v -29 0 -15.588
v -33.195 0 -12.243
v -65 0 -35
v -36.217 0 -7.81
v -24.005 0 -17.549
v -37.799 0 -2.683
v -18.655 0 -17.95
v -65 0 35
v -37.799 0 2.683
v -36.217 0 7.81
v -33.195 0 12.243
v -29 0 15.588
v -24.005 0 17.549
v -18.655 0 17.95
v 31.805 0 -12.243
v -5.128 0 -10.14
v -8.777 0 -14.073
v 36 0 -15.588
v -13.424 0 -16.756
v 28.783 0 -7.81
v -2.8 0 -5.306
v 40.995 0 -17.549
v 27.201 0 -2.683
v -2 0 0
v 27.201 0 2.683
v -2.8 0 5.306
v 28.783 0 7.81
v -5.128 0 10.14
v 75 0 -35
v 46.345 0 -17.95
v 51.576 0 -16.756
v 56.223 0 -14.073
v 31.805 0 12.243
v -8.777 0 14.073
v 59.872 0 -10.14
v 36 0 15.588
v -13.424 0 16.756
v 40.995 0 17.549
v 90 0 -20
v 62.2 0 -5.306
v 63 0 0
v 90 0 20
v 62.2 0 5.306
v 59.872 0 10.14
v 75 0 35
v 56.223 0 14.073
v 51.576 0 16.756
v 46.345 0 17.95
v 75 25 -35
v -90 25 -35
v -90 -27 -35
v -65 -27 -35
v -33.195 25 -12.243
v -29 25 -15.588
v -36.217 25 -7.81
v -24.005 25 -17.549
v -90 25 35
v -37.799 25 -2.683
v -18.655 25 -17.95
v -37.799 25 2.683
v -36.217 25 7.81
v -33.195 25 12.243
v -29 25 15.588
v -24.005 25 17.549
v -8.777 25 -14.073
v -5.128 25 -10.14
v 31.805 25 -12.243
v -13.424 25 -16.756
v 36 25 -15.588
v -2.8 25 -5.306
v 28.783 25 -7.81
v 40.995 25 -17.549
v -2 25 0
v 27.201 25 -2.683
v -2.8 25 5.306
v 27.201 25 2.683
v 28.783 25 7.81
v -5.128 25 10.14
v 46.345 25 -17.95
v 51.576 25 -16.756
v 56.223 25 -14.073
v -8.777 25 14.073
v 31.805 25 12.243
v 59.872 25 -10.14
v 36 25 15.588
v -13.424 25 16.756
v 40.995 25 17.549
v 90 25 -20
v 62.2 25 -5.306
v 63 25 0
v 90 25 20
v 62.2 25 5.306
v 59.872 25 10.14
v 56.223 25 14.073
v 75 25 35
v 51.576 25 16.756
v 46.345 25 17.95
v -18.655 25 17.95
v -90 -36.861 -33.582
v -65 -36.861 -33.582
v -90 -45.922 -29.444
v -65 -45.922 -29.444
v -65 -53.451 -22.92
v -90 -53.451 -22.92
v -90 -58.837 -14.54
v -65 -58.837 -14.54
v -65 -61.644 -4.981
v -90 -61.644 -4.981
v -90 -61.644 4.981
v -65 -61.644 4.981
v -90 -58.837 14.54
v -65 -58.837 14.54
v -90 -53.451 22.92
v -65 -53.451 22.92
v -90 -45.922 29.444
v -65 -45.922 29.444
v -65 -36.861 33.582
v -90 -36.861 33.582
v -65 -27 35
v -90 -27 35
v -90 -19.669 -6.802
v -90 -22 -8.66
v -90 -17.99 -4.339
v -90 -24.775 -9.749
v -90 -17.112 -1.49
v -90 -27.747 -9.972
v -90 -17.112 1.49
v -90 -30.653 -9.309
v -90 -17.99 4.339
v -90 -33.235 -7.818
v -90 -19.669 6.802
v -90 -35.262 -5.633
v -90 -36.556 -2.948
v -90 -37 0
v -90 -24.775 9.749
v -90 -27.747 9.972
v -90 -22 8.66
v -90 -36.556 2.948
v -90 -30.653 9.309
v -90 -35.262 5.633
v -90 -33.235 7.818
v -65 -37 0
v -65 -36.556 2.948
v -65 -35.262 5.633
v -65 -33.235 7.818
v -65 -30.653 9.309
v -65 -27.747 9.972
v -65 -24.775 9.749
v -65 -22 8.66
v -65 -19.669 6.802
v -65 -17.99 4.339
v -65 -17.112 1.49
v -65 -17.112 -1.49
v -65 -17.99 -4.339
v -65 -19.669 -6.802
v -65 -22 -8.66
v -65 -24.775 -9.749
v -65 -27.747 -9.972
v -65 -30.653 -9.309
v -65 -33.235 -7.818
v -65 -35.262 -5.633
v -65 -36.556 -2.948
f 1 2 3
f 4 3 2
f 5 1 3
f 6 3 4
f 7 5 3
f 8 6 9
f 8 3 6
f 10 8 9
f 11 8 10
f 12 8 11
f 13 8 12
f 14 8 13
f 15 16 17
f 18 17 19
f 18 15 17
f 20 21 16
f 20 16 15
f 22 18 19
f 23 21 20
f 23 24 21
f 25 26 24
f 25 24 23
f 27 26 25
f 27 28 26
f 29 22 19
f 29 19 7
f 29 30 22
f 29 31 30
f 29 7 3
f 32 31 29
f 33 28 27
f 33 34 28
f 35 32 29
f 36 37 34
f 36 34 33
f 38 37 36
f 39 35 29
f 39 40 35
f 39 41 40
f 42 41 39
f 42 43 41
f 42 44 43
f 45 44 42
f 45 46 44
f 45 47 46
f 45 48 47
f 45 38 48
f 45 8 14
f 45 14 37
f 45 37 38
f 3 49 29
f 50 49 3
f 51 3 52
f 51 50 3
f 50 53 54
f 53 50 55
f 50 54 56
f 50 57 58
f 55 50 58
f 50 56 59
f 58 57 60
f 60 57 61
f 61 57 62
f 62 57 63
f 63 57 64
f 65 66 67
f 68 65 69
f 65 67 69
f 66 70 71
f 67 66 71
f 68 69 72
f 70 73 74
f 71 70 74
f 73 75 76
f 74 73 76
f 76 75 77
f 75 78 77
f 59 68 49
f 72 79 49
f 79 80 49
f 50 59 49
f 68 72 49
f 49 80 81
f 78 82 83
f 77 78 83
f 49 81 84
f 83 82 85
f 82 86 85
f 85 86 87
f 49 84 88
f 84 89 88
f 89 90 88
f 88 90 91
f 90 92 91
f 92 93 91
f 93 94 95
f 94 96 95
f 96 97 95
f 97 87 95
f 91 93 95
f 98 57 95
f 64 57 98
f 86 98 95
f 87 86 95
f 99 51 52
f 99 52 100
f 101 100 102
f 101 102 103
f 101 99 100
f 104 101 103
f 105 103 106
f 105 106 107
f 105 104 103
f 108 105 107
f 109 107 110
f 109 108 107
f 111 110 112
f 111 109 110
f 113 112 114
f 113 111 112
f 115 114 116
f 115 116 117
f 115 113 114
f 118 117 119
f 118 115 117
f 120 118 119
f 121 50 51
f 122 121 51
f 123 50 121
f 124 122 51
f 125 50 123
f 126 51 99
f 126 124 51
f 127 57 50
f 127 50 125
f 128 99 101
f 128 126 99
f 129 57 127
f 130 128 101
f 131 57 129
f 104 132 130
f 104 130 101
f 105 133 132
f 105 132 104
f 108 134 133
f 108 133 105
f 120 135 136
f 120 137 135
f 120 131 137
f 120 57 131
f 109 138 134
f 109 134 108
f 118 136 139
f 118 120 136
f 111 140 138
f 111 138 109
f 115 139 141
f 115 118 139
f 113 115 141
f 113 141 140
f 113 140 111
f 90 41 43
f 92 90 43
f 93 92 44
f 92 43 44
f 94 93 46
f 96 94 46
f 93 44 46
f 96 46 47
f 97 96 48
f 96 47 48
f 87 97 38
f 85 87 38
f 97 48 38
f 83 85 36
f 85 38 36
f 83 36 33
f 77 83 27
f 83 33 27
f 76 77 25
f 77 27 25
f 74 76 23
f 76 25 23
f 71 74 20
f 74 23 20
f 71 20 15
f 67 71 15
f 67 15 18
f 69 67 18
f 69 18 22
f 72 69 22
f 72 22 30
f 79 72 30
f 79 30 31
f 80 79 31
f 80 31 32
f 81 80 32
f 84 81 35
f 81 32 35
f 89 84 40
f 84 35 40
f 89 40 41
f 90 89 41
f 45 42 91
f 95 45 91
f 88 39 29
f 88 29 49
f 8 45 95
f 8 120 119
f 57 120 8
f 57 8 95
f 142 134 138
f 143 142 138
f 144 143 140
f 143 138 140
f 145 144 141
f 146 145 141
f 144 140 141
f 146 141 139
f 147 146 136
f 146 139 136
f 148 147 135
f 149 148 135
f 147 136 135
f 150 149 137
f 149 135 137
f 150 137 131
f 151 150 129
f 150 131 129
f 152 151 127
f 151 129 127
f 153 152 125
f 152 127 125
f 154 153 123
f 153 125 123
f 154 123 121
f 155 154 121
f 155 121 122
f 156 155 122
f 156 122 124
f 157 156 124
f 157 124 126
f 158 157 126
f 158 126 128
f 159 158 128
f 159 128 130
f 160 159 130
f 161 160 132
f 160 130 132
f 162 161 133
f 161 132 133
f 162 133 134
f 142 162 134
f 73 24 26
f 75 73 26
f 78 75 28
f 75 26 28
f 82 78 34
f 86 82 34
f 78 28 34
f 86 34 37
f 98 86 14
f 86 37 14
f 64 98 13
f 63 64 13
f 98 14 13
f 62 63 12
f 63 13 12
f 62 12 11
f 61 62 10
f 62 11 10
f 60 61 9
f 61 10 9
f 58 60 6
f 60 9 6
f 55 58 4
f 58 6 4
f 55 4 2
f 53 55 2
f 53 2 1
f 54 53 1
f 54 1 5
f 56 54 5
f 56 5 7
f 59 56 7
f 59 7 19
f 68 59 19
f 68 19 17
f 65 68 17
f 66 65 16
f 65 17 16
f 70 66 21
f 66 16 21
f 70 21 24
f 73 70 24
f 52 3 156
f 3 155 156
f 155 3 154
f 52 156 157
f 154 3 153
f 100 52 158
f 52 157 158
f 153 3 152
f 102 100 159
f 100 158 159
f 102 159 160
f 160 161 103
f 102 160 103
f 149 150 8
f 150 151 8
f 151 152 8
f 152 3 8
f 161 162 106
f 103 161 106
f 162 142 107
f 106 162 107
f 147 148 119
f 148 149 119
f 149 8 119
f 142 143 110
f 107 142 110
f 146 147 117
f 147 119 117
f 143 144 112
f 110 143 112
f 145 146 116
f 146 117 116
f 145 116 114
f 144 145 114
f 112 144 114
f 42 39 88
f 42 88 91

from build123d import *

# Parameters (mm, degrees)
F0_W     = 155
F0_H     = 70
F0_R     = 18
F0_W_2   = 25
F1_DEPTH = 25
F2_R     = 10
F3_DEPTH = 25
F4_SIZE  = 15


with BuildPart() as f1:
    # F0 (on Front) → F1 (new body)
    with BuildSketch(Plane.XZ):
        with Locations((12.5, 0)):
            Rectangle(F0_W, F0_H)
        with Locations((-20, 0)):
            Circle(F0_R, mode=Mode.SUBTRACT)
        with Locations((45, 0)):
            Circle(F0_R, mode=Mode.SUBTRACT)
        with Locations((-77.5, 0)):
            Rectangle(F0_W_2, F0_H)
    extrude(amount=-F1_DEPTH)

    # F2 (on face) → F3 (join)
    with BuildSketch(Plane(origin=(-90, 0, 0), x_dir=(0, -1, 0), z_dir=(-1, 0, 0))):
        with BuildLine():
            Line((27, 35), (0, 35))
            Line((0, 35), (0, -35))
            Line((0, -35), (27, -35))
            ThreePointArc((27, -35), (62, 0), (27, 35))
        make_face()
        with Locations((27, 0)):
            Circle(F2_R, mode=Mode.SUBTRACT)
    extrude(amount=-F3_DEPTH)

    # F4
    f4_edges = [f1.edges().sort_by_distance(p)[0] for p in [
        (90, 12.5, 35),
        (90, 12.5, -35),
    ]]
    chamfer(f4_edges, length=F4_SIZE)


solid = f1.part
